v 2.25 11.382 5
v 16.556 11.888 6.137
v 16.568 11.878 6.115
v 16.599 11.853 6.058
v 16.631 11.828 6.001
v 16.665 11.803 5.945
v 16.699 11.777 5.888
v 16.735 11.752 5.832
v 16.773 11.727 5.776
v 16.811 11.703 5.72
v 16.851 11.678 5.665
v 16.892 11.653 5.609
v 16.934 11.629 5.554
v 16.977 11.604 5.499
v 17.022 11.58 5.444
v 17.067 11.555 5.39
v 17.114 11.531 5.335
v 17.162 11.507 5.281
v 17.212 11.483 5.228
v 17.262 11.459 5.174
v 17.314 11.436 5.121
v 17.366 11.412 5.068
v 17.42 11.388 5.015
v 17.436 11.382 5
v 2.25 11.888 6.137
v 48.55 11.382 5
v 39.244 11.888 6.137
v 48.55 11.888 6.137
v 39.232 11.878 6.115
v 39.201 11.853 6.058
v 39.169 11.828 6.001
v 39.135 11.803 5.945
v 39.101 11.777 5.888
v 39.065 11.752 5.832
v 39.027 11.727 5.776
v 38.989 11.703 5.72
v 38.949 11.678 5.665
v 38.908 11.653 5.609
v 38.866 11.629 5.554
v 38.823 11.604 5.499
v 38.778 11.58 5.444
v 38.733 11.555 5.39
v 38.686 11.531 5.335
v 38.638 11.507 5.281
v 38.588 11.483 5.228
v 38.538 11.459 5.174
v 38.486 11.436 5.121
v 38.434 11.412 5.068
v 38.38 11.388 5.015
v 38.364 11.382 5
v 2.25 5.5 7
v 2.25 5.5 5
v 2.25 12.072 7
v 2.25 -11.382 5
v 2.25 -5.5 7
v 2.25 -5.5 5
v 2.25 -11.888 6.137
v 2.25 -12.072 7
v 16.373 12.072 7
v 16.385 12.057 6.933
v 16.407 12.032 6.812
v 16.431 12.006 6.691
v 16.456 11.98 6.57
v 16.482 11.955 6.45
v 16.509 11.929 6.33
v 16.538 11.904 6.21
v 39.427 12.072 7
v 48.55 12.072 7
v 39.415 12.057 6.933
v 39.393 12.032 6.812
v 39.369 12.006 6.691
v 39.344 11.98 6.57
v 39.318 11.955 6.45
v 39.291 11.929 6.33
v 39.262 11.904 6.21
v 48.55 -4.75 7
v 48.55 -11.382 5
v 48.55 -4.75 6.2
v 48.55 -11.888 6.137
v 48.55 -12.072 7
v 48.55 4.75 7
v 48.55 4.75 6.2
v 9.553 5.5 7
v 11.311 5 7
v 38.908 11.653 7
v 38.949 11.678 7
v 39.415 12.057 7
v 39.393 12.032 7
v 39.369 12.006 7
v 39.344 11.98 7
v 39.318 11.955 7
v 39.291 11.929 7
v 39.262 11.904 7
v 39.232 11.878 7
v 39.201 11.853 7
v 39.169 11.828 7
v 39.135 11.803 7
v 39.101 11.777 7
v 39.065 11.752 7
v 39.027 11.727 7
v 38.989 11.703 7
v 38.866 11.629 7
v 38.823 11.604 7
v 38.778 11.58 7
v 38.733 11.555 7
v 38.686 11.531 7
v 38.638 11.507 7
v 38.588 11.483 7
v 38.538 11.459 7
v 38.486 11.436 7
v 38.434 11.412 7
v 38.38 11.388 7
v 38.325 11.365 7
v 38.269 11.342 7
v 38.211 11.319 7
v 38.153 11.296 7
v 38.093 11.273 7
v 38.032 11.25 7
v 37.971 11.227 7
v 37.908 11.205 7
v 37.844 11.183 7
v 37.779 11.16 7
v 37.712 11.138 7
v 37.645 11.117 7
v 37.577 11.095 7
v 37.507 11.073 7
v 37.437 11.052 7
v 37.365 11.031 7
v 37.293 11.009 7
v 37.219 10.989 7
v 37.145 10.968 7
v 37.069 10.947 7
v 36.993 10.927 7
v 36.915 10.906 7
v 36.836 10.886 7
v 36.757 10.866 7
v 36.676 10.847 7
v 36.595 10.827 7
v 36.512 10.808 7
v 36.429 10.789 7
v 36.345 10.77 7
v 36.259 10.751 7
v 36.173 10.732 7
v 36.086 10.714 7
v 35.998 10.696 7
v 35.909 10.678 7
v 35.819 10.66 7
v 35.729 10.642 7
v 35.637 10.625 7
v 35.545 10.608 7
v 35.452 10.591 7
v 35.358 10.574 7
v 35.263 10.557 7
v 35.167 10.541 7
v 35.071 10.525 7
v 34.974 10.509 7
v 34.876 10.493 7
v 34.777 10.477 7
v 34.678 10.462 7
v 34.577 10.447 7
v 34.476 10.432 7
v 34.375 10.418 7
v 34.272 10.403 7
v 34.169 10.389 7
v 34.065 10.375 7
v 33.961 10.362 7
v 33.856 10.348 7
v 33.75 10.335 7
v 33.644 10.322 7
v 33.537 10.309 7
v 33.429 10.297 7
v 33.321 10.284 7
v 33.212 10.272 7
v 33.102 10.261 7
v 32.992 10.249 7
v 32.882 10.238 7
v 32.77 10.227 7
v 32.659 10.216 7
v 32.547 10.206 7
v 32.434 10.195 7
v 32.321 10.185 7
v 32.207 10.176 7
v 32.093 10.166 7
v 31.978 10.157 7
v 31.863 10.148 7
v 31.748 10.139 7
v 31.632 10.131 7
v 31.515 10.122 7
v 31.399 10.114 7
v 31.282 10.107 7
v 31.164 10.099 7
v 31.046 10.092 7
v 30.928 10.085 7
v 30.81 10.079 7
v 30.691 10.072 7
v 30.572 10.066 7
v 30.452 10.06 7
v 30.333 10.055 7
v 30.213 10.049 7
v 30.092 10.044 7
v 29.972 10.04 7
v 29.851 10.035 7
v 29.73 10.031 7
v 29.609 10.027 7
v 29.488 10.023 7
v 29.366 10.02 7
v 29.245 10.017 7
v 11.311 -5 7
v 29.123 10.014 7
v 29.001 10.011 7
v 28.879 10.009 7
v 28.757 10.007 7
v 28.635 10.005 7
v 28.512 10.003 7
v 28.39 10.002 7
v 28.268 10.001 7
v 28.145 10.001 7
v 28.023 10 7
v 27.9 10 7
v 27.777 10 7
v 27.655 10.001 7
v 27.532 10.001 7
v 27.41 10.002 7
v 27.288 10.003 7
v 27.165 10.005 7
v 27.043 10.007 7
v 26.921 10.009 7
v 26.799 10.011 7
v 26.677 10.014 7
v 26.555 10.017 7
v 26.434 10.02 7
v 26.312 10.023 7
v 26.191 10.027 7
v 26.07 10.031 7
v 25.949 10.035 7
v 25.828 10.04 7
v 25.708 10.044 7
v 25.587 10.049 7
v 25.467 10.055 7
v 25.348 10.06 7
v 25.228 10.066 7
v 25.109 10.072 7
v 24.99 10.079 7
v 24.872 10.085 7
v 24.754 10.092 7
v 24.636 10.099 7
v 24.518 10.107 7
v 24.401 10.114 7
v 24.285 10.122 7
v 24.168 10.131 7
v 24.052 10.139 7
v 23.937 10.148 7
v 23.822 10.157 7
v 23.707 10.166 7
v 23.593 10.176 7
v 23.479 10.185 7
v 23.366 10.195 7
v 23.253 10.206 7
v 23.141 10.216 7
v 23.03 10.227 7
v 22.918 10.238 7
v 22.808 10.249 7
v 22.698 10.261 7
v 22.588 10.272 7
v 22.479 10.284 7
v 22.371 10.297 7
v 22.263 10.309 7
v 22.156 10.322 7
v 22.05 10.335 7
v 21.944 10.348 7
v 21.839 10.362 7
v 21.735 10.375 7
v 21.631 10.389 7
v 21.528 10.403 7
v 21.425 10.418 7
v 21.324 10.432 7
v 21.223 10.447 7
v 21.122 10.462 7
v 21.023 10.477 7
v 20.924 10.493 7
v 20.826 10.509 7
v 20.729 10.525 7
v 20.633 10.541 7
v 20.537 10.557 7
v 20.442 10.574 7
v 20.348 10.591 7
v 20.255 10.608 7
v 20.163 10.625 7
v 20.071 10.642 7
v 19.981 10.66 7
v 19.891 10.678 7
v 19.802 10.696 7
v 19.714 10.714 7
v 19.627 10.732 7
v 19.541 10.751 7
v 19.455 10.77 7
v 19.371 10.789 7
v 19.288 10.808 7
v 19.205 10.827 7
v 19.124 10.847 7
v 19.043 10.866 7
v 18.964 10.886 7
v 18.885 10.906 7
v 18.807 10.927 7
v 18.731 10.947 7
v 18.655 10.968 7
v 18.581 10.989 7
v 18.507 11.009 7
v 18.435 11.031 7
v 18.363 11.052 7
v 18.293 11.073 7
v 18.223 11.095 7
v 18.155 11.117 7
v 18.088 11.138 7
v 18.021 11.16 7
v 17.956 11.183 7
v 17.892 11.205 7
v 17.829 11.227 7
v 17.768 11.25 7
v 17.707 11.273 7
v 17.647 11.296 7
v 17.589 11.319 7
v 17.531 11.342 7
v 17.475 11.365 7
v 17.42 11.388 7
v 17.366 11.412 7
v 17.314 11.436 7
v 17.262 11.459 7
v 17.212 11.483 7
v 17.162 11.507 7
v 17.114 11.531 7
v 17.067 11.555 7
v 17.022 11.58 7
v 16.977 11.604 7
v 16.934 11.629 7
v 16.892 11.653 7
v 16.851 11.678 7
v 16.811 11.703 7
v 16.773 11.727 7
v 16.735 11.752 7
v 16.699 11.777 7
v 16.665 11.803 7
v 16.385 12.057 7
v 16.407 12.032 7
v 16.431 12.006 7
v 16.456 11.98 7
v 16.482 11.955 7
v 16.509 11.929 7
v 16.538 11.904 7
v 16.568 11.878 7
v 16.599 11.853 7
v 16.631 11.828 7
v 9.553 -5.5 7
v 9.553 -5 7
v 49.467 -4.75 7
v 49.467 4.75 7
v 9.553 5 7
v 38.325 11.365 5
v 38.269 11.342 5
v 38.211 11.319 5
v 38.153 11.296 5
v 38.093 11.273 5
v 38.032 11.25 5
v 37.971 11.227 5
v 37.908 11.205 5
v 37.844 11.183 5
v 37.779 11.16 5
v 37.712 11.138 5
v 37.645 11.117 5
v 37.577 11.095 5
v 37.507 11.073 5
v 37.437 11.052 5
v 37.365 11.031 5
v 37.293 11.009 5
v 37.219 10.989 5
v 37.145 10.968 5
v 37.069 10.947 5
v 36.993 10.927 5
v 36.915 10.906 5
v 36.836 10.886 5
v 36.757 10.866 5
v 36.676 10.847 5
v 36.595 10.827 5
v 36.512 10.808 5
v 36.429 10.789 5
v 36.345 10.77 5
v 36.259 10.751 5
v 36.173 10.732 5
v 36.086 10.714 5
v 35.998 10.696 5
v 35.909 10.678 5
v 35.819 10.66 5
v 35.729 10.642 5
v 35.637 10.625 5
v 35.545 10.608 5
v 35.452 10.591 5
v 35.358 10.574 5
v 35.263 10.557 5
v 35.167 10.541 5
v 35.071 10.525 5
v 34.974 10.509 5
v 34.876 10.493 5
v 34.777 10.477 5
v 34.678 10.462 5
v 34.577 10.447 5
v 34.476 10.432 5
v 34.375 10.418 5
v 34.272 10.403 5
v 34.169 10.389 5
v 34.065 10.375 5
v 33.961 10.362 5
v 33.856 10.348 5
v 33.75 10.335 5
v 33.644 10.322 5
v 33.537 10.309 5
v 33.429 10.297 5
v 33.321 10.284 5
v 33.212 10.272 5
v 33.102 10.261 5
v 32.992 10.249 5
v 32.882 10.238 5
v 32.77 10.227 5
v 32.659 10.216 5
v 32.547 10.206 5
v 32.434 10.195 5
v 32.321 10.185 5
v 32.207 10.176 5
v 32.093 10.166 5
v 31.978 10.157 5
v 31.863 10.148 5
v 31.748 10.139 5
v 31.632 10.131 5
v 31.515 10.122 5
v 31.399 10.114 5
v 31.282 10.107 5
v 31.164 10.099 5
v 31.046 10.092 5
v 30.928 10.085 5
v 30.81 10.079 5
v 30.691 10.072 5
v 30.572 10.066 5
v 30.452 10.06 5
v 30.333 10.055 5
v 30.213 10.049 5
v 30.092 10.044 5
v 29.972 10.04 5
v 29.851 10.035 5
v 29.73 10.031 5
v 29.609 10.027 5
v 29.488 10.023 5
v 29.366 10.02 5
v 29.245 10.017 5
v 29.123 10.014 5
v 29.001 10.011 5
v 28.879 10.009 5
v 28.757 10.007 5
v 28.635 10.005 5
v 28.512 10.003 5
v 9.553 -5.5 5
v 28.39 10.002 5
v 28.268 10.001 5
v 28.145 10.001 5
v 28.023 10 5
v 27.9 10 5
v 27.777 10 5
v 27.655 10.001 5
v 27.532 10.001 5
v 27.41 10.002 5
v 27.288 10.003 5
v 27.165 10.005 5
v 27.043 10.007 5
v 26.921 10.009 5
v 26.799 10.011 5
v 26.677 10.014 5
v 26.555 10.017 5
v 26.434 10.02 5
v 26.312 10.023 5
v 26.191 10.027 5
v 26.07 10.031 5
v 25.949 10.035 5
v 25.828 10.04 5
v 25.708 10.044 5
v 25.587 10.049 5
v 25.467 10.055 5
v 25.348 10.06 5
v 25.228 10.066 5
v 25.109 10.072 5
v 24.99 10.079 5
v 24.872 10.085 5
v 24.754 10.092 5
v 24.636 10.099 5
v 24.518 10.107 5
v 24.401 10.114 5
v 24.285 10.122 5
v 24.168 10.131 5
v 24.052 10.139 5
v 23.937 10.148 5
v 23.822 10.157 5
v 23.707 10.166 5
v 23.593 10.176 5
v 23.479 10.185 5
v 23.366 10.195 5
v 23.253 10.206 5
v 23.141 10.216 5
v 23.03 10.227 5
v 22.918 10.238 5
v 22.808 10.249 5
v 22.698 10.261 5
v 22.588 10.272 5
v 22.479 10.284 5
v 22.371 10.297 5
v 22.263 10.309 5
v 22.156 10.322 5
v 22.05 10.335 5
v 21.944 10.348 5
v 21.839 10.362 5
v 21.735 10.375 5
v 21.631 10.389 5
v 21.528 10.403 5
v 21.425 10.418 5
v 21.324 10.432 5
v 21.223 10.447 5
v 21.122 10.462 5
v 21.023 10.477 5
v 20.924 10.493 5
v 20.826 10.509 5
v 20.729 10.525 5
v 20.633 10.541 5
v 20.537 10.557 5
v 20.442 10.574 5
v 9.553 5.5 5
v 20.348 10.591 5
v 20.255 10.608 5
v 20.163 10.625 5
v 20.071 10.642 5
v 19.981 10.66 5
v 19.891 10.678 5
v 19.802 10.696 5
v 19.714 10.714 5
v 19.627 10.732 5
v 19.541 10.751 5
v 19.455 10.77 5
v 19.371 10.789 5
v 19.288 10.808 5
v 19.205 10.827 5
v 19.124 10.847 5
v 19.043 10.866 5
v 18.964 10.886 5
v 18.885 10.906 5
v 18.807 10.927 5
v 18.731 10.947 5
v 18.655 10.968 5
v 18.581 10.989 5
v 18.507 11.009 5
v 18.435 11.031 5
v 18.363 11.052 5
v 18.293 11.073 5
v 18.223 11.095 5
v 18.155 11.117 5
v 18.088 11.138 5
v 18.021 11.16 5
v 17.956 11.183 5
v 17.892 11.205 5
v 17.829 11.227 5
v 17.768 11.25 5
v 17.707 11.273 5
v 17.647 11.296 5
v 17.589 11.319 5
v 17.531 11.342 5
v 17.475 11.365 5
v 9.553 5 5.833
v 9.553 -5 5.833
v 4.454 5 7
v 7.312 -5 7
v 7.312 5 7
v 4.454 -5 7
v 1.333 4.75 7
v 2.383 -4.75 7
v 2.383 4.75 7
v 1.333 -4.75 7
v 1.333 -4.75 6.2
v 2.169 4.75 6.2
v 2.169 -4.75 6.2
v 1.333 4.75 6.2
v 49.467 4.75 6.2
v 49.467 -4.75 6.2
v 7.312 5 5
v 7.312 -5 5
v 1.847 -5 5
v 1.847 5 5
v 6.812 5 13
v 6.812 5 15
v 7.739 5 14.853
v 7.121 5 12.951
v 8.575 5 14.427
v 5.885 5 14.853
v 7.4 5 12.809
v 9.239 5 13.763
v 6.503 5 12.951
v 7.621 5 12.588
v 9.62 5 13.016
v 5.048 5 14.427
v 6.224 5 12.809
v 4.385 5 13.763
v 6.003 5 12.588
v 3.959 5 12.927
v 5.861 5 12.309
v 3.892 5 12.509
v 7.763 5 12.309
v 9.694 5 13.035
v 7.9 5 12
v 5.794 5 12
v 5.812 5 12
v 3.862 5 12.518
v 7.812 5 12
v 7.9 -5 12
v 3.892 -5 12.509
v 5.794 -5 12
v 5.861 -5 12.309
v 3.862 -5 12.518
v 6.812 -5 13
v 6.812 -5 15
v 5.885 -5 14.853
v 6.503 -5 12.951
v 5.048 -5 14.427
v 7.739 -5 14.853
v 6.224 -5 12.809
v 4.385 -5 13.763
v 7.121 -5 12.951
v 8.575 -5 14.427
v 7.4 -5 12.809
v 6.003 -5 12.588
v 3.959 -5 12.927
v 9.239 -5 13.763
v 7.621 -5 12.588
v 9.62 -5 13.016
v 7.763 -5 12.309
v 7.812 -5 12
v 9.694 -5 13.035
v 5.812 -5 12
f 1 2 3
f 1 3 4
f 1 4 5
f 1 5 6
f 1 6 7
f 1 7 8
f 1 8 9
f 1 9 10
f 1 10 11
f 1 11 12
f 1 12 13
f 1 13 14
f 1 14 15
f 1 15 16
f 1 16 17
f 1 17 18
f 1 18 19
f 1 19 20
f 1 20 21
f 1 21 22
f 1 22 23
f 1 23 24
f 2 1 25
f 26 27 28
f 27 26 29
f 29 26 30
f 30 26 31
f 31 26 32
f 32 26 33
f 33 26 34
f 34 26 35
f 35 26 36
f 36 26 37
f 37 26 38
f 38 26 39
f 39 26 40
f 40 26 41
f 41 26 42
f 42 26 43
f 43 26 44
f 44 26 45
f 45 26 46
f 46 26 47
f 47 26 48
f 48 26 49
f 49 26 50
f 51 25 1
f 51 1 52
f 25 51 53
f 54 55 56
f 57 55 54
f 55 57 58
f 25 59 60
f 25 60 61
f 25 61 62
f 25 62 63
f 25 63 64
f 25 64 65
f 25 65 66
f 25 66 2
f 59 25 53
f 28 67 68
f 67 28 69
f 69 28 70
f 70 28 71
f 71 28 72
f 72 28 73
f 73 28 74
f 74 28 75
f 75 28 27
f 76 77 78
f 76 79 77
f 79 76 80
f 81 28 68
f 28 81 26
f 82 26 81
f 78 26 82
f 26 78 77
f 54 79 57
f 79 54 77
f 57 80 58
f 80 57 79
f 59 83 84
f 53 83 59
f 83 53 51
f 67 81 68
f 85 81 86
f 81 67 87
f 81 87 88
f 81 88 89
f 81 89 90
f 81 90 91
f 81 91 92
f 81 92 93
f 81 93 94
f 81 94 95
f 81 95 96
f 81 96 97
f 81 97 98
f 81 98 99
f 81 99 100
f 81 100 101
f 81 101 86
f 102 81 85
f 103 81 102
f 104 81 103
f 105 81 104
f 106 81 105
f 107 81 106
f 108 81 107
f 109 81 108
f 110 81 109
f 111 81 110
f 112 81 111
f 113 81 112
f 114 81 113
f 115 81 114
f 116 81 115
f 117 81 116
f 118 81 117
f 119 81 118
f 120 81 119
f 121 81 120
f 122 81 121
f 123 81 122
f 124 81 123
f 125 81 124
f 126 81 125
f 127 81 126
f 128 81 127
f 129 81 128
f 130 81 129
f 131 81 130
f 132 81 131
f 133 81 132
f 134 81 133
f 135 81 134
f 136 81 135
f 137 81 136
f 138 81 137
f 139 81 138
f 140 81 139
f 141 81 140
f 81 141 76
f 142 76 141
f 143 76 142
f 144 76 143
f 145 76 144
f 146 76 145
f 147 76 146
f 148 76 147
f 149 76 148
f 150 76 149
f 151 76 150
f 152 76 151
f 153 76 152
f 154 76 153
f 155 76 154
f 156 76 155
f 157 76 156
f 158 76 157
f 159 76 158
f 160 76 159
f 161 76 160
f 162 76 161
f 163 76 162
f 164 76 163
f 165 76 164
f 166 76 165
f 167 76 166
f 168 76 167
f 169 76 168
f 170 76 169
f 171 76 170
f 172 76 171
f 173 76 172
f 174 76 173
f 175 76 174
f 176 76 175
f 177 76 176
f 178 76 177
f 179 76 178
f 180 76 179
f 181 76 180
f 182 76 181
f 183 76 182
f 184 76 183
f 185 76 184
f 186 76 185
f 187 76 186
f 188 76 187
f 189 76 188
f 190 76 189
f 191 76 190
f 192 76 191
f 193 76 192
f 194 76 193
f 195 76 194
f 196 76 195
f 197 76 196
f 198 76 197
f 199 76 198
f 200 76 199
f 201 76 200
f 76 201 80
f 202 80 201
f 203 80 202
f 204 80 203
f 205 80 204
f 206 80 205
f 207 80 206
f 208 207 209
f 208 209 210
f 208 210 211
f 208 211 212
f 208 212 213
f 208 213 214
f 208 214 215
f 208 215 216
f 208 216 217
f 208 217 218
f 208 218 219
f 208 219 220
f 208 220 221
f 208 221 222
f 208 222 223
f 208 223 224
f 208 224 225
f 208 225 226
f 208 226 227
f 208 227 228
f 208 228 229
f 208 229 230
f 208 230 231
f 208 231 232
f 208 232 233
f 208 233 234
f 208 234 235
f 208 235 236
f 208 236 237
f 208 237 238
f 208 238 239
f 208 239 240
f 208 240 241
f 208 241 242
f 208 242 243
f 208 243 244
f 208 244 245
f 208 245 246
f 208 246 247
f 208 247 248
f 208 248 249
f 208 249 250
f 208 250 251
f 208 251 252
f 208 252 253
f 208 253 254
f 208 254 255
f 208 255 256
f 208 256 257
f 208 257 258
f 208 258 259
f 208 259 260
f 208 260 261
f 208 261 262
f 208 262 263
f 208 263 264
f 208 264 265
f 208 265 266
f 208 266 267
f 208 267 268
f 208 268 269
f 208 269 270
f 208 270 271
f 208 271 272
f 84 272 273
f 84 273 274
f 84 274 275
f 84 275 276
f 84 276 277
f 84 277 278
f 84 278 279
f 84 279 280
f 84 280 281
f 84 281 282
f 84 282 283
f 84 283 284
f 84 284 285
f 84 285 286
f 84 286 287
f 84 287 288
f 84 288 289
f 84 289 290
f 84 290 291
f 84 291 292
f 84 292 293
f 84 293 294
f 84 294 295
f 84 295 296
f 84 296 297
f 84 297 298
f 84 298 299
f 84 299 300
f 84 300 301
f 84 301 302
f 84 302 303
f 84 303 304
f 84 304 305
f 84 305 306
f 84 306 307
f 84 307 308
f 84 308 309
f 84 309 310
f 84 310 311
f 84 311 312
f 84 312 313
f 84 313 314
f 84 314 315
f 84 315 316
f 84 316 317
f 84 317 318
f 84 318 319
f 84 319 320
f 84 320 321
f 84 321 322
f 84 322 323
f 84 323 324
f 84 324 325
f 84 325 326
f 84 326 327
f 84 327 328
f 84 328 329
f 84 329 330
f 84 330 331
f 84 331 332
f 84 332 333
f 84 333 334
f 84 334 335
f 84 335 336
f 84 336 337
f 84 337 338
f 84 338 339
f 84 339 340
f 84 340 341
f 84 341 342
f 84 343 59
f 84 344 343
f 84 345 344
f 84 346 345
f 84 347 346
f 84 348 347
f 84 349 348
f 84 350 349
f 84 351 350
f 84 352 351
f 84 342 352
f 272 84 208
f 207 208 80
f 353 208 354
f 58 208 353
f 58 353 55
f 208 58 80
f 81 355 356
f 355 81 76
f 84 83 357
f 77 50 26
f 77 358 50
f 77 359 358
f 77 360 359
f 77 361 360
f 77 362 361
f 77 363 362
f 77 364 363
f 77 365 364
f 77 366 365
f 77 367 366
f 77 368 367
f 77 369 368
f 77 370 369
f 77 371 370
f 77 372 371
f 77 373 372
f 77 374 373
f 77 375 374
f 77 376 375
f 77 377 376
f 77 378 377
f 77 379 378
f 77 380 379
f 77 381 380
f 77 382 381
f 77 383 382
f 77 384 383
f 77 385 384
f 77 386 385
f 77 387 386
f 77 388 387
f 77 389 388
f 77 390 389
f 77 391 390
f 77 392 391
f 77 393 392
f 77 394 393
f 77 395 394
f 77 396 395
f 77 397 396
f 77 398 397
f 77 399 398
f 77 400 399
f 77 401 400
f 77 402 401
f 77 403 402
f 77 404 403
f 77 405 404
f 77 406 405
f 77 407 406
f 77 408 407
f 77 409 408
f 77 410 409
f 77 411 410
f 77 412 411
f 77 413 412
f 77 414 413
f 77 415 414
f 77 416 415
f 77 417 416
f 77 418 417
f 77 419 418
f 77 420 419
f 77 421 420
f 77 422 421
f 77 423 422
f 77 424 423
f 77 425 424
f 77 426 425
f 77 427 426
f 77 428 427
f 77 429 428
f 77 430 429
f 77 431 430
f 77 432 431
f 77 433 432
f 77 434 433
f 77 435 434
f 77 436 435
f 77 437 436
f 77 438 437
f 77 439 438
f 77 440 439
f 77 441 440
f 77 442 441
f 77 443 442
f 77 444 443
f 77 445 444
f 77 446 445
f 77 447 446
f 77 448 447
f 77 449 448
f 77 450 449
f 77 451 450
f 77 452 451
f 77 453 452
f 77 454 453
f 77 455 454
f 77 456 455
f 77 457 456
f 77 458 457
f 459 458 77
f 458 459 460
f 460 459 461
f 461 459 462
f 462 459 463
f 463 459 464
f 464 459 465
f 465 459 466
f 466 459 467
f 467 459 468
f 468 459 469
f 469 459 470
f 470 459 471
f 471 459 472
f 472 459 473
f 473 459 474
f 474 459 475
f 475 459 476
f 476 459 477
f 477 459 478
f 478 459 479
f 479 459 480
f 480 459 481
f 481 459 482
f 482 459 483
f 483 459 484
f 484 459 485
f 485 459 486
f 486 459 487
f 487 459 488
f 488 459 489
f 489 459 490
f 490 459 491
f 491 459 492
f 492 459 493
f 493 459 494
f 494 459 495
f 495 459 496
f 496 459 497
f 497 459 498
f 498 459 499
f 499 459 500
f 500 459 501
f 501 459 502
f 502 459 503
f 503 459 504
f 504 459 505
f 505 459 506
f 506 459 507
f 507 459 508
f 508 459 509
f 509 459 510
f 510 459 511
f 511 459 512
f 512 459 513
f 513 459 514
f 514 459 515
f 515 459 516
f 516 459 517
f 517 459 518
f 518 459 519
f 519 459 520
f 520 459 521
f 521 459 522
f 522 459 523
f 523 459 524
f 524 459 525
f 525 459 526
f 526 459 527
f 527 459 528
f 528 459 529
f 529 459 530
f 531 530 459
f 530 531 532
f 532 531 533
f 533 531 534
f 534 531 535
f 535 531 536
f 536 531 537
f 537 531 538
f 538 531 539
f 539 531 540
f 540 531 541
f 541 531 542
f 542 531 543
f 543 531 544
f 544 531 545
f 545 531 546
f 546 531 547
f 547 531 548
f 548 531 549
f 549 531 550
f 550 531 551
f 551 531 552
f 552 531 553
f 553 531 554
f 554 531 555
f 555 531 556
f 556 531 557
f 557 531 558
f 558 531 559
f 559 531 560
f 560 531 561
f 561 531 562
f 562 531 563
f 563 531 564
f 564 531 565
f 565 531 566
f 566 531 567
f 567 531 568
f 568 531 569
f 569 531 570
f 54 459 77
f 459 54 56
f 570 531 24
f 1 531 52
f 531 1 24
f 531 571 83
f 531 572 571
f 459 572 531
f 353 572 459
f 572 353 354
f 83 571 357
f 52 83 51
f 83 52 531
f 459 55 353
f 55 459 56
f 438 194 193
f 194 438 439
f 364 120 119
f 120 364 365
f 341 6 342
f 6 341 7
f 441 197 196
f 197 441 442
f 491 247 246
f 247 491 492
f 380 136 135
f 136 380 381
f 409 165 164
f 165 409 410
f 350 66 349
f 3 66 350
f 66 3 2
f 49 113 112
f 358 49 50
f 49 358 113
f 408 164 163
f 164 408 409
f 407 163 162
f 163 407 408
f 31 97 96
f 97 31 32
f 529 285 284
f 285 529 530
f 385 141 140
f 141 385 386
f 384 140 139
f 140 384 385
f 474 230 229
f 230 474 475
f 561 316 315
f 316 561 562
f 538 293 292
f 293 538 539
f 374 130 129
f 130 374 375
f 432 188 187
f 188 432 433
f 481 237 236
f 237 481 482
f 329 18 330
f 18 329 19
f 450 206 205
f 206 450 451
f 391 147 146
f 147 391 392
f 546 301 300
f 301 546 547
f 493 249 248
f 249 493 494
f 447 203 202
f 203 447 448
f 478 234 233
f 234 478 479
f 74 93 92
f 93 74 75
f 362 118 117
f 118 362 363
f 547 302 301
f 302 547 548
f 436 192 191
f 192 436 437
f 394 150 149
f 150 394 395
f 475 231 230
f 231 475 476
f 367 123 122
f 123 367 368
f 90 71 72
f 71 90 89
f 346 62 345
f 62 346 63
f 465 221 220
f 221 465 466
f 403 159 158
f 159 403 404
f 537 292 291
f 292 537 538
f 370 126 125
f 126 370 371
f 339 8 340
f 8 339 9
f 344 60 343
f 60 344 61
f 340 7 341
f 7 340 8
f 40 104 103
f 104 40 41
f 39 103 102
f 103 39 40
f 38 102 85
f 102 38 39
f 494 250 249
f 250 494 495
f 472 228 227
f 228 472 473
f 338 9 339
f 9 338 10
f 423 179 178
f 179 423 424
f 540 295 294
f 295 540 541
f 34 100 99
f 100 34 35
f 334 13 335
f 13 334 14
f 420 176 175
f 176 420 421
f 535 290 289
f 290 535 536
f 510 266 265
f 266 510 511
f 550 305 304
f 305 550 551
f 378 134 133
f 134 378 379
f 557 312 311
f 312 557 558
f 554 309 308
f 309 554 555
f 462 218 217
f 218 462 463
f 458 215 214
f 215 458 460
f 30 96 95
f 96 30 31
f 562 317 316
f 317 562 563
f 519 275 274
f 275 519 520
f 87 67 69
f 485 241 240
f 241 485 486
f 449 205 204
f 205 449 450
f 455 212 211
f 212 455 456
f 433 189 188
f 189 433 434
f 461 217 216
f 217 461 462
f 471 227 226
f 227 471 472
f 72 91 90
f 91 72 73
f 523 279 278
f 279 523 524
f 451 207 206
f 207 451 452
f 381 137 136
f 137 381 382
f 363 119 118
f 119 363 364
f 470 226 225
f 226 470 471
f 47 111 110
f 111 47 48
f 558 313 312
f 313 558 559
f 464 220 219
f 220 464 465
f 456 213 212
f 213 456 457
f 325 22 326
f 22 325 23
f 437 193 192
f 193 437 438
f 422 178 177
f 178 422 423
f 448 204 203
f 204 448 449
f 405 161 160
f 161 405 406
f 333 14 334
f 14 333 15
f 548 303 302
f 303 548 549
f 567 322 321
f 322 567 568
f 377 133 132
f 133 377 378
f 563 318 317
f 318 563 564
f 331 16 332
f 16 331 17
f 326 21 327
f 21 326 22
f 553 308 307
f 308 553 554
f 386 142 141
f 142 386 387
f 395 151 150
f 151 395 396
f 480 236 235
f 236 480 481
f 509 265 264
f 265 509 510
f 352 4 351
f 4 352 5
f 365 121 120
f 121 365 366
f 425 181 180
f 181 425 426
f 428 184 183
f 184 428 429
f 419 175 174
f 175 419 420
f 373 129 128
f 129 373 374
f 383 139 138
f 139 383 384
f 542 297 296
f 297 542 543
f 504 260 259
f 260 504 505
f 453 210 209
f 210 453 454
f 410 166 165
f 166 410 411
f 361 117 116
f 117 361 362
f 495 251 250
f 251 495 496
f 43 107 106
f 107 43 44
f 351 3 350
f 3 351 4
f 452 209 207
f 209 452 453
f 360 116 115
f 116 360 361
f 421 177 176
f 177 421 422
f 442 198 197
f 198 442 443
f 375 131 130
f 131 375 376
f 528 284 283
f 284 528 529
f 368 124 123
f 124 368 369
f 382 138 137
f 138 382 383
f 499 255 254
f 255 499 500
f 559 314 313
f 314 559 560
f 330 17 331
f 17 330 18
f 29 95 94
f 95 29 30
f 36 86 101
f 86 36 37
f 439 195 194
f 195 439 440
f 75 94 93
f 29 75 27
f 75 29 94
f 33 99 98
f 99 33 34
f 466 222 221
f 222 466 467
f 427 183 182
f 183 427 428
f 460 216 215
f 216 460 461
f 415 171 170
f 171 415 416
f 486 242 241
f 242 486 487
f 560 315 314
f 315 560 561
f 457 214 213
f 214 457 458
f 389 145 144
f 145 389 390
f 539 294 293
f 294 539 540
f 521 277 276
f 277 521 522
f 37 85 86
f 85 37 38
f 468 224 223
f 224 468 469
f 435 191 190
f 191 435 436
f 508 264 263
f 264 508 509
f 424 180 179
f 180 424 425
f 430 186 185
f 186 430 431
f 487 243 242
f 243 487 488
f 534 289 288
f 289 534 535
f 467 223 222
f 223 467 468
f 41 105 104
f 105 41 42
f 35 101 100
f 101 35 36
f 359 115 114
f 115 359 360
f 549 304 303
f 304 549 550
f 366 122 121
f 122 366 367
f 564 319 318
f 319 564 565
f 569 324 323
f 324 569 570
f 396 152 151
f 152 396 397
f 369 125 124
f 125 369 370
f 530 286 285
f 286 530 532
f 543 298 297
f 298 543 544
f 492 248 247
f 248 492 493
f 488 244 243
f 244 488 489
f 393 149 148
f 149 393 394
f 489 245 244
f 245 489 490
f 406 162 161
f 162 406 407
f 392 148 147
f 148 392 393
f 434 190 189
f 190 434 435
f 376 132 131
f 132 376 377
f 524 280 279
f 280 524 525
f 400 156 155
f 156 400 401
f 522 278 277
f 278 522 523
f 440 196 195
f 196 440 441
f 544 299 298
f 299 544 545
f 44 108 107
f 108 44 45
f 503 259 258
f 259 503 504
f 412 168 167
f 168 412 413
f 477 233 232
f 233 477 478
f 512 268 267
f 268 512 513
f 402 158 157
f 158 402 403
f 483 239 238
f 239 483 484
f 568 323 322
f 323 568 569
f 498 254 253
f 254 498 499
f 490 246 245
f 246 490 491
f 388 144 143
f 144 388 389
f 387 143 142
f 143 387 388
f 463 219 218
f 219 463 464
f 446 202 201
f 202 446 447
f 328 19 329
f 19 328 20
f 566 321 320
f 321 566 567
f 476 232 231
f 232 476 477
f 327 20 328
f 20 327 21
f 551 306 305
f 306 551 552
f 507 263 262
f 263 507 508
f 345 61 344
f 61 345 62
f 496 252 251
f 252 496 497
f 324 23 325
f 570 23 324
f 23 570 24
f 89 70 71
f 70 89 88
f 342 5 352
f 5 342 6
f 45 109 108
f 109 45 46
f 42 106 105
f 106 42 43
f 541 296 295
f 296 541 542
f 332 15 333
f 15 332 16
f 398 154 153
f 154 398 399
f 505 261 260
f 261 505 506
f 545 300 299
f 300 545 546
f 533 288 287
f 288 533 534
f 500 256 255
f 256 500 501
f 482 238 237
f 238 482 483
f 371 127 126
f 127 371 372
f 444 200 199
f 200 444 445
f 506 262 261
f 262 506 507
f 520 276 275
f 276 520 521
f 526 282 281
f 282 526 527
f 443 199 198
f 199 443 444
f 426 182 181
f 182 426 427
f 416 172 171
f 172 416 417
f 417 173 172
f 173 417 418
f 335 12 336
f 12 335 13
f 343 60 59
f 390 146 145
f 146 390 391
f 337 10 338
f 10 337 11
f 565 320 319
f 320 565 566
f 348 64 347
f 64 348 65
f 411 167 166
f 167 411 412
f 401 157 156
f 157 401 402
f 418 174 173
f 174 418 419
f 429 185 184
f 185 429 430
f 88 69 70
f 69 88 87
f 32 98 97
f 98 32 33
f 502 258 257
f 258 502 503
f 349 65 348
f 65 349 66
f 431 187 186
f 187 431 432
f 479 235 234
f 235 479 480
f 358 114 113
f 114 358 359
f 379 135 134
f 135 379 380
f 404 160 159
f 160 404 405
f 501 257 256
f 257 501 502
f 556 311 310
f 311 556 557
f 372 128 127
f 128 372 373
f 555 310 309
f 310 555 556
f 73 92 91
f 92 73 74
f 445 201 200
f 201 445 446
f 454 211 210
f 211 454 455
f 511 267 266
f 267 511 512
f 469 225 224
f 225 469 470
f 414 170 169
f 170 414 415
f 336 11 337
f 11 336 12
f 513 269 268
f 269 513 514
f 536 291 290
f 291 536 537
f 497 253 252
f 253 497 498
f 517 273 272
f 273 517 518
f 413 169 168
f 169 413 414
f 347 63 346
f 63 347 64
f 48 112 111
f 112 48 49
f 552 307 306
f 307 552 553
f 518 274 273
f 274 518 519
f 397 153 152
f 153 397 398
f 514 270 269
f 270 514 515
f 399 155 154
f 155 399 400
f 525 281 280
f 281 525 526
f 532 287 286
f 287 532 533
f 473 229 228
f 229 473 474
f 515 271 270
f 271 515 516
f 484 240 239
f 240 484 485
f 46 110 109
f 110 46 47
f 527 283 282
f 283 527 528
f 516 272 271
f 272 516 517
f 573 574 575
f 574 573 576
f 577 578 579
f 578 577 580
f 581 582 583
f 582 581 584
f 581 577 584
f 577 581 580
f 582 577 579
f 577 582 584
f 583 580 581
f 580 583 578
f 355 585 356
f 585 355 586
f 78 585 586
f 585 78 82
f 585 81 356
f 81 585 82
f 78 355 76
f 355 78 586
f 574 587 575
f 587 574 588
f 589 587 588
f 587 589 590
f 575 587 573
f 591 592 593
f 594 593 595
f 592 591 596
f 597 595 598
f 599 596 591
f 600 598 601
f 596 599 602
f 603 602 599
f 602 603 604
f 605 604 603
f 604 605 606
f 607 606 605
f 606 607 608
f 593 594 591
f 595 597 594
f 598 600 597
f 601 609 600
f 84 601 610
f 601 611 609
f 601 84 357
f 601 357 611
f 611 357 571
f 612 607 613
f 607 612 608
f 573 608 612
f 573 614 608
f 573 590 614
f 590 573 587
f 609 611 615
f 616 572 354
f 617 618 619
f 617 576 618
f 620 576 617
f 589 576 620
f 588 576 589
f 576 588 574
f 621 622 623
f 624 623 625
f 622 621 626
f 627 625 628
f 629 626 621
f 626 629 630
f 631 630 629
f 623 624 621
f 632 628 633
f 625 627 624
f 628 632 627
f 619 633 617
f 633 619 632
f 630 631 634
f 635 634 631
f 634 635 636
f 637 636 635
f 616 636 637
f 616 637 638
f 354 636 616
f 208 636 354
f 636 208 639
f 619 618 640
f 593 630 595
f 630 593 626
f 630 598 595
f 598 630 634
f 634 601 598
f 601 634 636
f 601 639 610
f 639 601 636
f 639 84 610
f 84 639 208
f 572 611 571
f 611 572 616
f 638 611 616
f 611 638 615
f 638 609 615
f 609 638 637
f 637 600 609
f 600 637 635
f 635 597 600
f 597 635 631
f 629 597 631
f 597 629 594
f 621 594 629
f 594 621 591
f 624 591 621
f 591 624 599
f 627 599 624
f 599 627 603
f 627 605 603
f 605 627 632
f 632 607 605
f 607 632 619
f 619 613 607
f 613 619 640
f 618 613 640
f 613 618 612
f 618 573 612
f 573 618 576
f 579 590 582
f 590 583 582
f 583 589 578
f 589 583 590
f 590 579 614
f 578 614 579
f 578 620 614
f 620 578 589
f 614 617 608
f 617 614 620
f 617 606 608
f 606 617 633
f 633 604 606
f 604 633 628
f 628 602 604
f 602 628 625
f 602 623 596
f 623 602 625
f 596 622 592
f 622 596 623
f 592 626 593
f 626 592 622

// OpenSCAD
// file: params.scad
hob_radius = 1.84;
hob_spacing = 5.08;

hobs_wide = 8;
hobs_deep = 1;

case_width = 30;
case_length = (hobs_wide+2)*hob_spacing;
case_thick = 2;
case_slice = case_width / 3;

arm_depth = 10;
// main file
/*
  Snap-in back for led case
*/

include <params.scad>

rad = 3;

arm_len = 7;
arm_width = 2;
arm_angle = 15;

translate([rad + sin(arm_angle)*arm_len + case_thick, -arm_depth/2, arm_len + case_width/2 - case_width/3])
rotate([-90,0,0])
linear_extrude(height=arm_depth)
difference() {
    union() {
        // arc
        difference() {
            circle(r=rad, $fn=20);
            circle(r=rad-arm_width, $fn=20);
            translate([-rad,0,0])
                square([rad*2,rad]);
        };

        // arm 1
        translate([-rad + 0.05,-sin(arm_angle)*arm_width,0])
        rotate(arm_angle)
            square([arm_width, arm_len+5]);

        // arm 2
        translate([rad - arm_width - 0.05,-sin(arm_angle)*arm_width,0])
        rotate(-arm_angle)
            square([arm_width, arm_len+5]);
    };
    cutout_width = sin(arm_angle)*(arm_len+5)*2+rad*2;
    translate([-cutout_width/2,arm_len])
        square([cutout_width,5]);
};

union() {
    difference() {
        intersection() {
            translate([2+0.25,0,case_width/3])
            rotate([0,90,0])
                cylinder(h=case_length-case_thick*2- 0.5, r = case_width/2 - case_thick - 0.5);
            translate([-0.5, -case_width/2, -case_width/2 + case_width/3 + case_slice])
                cube([case_length+1, case_width, case_thick]);
        };
        translate([case_thick, -arm_depth/2 - 0.5, case_width/2 - case_width/3 - 0.5])
            cube([rad*2 + sin(arm_angle)*arm_len*2 - arm_width/sin(90-arm_angle), arm_depth + 1, case_thick + 1]);
        translate([case_length / 2 + case_thick + 0.5,case_width/2 - 2.5,case_width/2 - case_width/3 - 0.5])
        scale([case_length / 2 - case_thick,5,1])
            cylinder(r=0.5, h=case_thick+1, $fn=600);
    };

    // lump on clip
    translate([case_thick/3 * 2, -arm_depth/2 + 0.25, -case_width/2 + case_width/3 + case_slice + 1 + 0.2])
        cube([1.5,arm_depth - 0.5,0.8]);

    // lump on other end from clip
    translate([case_thick/3 * 2 + case_length - case_thick*2 + case_thick/3 * 2 - 2, -arm_depth/2 + 0.25, -case_width/2 + case_width/3 + case_slice + 1 + 0.2])
        cube([2,arm_depth - 0.5,0.8]);

    // pad at base of clip
    translate([case_thick + 0.5, -arm_depth/2, case_width/2 - case_width/3])
        cube([rad + sin(arm_angle)*arm_len, arm_depth, case_thick]);
};
